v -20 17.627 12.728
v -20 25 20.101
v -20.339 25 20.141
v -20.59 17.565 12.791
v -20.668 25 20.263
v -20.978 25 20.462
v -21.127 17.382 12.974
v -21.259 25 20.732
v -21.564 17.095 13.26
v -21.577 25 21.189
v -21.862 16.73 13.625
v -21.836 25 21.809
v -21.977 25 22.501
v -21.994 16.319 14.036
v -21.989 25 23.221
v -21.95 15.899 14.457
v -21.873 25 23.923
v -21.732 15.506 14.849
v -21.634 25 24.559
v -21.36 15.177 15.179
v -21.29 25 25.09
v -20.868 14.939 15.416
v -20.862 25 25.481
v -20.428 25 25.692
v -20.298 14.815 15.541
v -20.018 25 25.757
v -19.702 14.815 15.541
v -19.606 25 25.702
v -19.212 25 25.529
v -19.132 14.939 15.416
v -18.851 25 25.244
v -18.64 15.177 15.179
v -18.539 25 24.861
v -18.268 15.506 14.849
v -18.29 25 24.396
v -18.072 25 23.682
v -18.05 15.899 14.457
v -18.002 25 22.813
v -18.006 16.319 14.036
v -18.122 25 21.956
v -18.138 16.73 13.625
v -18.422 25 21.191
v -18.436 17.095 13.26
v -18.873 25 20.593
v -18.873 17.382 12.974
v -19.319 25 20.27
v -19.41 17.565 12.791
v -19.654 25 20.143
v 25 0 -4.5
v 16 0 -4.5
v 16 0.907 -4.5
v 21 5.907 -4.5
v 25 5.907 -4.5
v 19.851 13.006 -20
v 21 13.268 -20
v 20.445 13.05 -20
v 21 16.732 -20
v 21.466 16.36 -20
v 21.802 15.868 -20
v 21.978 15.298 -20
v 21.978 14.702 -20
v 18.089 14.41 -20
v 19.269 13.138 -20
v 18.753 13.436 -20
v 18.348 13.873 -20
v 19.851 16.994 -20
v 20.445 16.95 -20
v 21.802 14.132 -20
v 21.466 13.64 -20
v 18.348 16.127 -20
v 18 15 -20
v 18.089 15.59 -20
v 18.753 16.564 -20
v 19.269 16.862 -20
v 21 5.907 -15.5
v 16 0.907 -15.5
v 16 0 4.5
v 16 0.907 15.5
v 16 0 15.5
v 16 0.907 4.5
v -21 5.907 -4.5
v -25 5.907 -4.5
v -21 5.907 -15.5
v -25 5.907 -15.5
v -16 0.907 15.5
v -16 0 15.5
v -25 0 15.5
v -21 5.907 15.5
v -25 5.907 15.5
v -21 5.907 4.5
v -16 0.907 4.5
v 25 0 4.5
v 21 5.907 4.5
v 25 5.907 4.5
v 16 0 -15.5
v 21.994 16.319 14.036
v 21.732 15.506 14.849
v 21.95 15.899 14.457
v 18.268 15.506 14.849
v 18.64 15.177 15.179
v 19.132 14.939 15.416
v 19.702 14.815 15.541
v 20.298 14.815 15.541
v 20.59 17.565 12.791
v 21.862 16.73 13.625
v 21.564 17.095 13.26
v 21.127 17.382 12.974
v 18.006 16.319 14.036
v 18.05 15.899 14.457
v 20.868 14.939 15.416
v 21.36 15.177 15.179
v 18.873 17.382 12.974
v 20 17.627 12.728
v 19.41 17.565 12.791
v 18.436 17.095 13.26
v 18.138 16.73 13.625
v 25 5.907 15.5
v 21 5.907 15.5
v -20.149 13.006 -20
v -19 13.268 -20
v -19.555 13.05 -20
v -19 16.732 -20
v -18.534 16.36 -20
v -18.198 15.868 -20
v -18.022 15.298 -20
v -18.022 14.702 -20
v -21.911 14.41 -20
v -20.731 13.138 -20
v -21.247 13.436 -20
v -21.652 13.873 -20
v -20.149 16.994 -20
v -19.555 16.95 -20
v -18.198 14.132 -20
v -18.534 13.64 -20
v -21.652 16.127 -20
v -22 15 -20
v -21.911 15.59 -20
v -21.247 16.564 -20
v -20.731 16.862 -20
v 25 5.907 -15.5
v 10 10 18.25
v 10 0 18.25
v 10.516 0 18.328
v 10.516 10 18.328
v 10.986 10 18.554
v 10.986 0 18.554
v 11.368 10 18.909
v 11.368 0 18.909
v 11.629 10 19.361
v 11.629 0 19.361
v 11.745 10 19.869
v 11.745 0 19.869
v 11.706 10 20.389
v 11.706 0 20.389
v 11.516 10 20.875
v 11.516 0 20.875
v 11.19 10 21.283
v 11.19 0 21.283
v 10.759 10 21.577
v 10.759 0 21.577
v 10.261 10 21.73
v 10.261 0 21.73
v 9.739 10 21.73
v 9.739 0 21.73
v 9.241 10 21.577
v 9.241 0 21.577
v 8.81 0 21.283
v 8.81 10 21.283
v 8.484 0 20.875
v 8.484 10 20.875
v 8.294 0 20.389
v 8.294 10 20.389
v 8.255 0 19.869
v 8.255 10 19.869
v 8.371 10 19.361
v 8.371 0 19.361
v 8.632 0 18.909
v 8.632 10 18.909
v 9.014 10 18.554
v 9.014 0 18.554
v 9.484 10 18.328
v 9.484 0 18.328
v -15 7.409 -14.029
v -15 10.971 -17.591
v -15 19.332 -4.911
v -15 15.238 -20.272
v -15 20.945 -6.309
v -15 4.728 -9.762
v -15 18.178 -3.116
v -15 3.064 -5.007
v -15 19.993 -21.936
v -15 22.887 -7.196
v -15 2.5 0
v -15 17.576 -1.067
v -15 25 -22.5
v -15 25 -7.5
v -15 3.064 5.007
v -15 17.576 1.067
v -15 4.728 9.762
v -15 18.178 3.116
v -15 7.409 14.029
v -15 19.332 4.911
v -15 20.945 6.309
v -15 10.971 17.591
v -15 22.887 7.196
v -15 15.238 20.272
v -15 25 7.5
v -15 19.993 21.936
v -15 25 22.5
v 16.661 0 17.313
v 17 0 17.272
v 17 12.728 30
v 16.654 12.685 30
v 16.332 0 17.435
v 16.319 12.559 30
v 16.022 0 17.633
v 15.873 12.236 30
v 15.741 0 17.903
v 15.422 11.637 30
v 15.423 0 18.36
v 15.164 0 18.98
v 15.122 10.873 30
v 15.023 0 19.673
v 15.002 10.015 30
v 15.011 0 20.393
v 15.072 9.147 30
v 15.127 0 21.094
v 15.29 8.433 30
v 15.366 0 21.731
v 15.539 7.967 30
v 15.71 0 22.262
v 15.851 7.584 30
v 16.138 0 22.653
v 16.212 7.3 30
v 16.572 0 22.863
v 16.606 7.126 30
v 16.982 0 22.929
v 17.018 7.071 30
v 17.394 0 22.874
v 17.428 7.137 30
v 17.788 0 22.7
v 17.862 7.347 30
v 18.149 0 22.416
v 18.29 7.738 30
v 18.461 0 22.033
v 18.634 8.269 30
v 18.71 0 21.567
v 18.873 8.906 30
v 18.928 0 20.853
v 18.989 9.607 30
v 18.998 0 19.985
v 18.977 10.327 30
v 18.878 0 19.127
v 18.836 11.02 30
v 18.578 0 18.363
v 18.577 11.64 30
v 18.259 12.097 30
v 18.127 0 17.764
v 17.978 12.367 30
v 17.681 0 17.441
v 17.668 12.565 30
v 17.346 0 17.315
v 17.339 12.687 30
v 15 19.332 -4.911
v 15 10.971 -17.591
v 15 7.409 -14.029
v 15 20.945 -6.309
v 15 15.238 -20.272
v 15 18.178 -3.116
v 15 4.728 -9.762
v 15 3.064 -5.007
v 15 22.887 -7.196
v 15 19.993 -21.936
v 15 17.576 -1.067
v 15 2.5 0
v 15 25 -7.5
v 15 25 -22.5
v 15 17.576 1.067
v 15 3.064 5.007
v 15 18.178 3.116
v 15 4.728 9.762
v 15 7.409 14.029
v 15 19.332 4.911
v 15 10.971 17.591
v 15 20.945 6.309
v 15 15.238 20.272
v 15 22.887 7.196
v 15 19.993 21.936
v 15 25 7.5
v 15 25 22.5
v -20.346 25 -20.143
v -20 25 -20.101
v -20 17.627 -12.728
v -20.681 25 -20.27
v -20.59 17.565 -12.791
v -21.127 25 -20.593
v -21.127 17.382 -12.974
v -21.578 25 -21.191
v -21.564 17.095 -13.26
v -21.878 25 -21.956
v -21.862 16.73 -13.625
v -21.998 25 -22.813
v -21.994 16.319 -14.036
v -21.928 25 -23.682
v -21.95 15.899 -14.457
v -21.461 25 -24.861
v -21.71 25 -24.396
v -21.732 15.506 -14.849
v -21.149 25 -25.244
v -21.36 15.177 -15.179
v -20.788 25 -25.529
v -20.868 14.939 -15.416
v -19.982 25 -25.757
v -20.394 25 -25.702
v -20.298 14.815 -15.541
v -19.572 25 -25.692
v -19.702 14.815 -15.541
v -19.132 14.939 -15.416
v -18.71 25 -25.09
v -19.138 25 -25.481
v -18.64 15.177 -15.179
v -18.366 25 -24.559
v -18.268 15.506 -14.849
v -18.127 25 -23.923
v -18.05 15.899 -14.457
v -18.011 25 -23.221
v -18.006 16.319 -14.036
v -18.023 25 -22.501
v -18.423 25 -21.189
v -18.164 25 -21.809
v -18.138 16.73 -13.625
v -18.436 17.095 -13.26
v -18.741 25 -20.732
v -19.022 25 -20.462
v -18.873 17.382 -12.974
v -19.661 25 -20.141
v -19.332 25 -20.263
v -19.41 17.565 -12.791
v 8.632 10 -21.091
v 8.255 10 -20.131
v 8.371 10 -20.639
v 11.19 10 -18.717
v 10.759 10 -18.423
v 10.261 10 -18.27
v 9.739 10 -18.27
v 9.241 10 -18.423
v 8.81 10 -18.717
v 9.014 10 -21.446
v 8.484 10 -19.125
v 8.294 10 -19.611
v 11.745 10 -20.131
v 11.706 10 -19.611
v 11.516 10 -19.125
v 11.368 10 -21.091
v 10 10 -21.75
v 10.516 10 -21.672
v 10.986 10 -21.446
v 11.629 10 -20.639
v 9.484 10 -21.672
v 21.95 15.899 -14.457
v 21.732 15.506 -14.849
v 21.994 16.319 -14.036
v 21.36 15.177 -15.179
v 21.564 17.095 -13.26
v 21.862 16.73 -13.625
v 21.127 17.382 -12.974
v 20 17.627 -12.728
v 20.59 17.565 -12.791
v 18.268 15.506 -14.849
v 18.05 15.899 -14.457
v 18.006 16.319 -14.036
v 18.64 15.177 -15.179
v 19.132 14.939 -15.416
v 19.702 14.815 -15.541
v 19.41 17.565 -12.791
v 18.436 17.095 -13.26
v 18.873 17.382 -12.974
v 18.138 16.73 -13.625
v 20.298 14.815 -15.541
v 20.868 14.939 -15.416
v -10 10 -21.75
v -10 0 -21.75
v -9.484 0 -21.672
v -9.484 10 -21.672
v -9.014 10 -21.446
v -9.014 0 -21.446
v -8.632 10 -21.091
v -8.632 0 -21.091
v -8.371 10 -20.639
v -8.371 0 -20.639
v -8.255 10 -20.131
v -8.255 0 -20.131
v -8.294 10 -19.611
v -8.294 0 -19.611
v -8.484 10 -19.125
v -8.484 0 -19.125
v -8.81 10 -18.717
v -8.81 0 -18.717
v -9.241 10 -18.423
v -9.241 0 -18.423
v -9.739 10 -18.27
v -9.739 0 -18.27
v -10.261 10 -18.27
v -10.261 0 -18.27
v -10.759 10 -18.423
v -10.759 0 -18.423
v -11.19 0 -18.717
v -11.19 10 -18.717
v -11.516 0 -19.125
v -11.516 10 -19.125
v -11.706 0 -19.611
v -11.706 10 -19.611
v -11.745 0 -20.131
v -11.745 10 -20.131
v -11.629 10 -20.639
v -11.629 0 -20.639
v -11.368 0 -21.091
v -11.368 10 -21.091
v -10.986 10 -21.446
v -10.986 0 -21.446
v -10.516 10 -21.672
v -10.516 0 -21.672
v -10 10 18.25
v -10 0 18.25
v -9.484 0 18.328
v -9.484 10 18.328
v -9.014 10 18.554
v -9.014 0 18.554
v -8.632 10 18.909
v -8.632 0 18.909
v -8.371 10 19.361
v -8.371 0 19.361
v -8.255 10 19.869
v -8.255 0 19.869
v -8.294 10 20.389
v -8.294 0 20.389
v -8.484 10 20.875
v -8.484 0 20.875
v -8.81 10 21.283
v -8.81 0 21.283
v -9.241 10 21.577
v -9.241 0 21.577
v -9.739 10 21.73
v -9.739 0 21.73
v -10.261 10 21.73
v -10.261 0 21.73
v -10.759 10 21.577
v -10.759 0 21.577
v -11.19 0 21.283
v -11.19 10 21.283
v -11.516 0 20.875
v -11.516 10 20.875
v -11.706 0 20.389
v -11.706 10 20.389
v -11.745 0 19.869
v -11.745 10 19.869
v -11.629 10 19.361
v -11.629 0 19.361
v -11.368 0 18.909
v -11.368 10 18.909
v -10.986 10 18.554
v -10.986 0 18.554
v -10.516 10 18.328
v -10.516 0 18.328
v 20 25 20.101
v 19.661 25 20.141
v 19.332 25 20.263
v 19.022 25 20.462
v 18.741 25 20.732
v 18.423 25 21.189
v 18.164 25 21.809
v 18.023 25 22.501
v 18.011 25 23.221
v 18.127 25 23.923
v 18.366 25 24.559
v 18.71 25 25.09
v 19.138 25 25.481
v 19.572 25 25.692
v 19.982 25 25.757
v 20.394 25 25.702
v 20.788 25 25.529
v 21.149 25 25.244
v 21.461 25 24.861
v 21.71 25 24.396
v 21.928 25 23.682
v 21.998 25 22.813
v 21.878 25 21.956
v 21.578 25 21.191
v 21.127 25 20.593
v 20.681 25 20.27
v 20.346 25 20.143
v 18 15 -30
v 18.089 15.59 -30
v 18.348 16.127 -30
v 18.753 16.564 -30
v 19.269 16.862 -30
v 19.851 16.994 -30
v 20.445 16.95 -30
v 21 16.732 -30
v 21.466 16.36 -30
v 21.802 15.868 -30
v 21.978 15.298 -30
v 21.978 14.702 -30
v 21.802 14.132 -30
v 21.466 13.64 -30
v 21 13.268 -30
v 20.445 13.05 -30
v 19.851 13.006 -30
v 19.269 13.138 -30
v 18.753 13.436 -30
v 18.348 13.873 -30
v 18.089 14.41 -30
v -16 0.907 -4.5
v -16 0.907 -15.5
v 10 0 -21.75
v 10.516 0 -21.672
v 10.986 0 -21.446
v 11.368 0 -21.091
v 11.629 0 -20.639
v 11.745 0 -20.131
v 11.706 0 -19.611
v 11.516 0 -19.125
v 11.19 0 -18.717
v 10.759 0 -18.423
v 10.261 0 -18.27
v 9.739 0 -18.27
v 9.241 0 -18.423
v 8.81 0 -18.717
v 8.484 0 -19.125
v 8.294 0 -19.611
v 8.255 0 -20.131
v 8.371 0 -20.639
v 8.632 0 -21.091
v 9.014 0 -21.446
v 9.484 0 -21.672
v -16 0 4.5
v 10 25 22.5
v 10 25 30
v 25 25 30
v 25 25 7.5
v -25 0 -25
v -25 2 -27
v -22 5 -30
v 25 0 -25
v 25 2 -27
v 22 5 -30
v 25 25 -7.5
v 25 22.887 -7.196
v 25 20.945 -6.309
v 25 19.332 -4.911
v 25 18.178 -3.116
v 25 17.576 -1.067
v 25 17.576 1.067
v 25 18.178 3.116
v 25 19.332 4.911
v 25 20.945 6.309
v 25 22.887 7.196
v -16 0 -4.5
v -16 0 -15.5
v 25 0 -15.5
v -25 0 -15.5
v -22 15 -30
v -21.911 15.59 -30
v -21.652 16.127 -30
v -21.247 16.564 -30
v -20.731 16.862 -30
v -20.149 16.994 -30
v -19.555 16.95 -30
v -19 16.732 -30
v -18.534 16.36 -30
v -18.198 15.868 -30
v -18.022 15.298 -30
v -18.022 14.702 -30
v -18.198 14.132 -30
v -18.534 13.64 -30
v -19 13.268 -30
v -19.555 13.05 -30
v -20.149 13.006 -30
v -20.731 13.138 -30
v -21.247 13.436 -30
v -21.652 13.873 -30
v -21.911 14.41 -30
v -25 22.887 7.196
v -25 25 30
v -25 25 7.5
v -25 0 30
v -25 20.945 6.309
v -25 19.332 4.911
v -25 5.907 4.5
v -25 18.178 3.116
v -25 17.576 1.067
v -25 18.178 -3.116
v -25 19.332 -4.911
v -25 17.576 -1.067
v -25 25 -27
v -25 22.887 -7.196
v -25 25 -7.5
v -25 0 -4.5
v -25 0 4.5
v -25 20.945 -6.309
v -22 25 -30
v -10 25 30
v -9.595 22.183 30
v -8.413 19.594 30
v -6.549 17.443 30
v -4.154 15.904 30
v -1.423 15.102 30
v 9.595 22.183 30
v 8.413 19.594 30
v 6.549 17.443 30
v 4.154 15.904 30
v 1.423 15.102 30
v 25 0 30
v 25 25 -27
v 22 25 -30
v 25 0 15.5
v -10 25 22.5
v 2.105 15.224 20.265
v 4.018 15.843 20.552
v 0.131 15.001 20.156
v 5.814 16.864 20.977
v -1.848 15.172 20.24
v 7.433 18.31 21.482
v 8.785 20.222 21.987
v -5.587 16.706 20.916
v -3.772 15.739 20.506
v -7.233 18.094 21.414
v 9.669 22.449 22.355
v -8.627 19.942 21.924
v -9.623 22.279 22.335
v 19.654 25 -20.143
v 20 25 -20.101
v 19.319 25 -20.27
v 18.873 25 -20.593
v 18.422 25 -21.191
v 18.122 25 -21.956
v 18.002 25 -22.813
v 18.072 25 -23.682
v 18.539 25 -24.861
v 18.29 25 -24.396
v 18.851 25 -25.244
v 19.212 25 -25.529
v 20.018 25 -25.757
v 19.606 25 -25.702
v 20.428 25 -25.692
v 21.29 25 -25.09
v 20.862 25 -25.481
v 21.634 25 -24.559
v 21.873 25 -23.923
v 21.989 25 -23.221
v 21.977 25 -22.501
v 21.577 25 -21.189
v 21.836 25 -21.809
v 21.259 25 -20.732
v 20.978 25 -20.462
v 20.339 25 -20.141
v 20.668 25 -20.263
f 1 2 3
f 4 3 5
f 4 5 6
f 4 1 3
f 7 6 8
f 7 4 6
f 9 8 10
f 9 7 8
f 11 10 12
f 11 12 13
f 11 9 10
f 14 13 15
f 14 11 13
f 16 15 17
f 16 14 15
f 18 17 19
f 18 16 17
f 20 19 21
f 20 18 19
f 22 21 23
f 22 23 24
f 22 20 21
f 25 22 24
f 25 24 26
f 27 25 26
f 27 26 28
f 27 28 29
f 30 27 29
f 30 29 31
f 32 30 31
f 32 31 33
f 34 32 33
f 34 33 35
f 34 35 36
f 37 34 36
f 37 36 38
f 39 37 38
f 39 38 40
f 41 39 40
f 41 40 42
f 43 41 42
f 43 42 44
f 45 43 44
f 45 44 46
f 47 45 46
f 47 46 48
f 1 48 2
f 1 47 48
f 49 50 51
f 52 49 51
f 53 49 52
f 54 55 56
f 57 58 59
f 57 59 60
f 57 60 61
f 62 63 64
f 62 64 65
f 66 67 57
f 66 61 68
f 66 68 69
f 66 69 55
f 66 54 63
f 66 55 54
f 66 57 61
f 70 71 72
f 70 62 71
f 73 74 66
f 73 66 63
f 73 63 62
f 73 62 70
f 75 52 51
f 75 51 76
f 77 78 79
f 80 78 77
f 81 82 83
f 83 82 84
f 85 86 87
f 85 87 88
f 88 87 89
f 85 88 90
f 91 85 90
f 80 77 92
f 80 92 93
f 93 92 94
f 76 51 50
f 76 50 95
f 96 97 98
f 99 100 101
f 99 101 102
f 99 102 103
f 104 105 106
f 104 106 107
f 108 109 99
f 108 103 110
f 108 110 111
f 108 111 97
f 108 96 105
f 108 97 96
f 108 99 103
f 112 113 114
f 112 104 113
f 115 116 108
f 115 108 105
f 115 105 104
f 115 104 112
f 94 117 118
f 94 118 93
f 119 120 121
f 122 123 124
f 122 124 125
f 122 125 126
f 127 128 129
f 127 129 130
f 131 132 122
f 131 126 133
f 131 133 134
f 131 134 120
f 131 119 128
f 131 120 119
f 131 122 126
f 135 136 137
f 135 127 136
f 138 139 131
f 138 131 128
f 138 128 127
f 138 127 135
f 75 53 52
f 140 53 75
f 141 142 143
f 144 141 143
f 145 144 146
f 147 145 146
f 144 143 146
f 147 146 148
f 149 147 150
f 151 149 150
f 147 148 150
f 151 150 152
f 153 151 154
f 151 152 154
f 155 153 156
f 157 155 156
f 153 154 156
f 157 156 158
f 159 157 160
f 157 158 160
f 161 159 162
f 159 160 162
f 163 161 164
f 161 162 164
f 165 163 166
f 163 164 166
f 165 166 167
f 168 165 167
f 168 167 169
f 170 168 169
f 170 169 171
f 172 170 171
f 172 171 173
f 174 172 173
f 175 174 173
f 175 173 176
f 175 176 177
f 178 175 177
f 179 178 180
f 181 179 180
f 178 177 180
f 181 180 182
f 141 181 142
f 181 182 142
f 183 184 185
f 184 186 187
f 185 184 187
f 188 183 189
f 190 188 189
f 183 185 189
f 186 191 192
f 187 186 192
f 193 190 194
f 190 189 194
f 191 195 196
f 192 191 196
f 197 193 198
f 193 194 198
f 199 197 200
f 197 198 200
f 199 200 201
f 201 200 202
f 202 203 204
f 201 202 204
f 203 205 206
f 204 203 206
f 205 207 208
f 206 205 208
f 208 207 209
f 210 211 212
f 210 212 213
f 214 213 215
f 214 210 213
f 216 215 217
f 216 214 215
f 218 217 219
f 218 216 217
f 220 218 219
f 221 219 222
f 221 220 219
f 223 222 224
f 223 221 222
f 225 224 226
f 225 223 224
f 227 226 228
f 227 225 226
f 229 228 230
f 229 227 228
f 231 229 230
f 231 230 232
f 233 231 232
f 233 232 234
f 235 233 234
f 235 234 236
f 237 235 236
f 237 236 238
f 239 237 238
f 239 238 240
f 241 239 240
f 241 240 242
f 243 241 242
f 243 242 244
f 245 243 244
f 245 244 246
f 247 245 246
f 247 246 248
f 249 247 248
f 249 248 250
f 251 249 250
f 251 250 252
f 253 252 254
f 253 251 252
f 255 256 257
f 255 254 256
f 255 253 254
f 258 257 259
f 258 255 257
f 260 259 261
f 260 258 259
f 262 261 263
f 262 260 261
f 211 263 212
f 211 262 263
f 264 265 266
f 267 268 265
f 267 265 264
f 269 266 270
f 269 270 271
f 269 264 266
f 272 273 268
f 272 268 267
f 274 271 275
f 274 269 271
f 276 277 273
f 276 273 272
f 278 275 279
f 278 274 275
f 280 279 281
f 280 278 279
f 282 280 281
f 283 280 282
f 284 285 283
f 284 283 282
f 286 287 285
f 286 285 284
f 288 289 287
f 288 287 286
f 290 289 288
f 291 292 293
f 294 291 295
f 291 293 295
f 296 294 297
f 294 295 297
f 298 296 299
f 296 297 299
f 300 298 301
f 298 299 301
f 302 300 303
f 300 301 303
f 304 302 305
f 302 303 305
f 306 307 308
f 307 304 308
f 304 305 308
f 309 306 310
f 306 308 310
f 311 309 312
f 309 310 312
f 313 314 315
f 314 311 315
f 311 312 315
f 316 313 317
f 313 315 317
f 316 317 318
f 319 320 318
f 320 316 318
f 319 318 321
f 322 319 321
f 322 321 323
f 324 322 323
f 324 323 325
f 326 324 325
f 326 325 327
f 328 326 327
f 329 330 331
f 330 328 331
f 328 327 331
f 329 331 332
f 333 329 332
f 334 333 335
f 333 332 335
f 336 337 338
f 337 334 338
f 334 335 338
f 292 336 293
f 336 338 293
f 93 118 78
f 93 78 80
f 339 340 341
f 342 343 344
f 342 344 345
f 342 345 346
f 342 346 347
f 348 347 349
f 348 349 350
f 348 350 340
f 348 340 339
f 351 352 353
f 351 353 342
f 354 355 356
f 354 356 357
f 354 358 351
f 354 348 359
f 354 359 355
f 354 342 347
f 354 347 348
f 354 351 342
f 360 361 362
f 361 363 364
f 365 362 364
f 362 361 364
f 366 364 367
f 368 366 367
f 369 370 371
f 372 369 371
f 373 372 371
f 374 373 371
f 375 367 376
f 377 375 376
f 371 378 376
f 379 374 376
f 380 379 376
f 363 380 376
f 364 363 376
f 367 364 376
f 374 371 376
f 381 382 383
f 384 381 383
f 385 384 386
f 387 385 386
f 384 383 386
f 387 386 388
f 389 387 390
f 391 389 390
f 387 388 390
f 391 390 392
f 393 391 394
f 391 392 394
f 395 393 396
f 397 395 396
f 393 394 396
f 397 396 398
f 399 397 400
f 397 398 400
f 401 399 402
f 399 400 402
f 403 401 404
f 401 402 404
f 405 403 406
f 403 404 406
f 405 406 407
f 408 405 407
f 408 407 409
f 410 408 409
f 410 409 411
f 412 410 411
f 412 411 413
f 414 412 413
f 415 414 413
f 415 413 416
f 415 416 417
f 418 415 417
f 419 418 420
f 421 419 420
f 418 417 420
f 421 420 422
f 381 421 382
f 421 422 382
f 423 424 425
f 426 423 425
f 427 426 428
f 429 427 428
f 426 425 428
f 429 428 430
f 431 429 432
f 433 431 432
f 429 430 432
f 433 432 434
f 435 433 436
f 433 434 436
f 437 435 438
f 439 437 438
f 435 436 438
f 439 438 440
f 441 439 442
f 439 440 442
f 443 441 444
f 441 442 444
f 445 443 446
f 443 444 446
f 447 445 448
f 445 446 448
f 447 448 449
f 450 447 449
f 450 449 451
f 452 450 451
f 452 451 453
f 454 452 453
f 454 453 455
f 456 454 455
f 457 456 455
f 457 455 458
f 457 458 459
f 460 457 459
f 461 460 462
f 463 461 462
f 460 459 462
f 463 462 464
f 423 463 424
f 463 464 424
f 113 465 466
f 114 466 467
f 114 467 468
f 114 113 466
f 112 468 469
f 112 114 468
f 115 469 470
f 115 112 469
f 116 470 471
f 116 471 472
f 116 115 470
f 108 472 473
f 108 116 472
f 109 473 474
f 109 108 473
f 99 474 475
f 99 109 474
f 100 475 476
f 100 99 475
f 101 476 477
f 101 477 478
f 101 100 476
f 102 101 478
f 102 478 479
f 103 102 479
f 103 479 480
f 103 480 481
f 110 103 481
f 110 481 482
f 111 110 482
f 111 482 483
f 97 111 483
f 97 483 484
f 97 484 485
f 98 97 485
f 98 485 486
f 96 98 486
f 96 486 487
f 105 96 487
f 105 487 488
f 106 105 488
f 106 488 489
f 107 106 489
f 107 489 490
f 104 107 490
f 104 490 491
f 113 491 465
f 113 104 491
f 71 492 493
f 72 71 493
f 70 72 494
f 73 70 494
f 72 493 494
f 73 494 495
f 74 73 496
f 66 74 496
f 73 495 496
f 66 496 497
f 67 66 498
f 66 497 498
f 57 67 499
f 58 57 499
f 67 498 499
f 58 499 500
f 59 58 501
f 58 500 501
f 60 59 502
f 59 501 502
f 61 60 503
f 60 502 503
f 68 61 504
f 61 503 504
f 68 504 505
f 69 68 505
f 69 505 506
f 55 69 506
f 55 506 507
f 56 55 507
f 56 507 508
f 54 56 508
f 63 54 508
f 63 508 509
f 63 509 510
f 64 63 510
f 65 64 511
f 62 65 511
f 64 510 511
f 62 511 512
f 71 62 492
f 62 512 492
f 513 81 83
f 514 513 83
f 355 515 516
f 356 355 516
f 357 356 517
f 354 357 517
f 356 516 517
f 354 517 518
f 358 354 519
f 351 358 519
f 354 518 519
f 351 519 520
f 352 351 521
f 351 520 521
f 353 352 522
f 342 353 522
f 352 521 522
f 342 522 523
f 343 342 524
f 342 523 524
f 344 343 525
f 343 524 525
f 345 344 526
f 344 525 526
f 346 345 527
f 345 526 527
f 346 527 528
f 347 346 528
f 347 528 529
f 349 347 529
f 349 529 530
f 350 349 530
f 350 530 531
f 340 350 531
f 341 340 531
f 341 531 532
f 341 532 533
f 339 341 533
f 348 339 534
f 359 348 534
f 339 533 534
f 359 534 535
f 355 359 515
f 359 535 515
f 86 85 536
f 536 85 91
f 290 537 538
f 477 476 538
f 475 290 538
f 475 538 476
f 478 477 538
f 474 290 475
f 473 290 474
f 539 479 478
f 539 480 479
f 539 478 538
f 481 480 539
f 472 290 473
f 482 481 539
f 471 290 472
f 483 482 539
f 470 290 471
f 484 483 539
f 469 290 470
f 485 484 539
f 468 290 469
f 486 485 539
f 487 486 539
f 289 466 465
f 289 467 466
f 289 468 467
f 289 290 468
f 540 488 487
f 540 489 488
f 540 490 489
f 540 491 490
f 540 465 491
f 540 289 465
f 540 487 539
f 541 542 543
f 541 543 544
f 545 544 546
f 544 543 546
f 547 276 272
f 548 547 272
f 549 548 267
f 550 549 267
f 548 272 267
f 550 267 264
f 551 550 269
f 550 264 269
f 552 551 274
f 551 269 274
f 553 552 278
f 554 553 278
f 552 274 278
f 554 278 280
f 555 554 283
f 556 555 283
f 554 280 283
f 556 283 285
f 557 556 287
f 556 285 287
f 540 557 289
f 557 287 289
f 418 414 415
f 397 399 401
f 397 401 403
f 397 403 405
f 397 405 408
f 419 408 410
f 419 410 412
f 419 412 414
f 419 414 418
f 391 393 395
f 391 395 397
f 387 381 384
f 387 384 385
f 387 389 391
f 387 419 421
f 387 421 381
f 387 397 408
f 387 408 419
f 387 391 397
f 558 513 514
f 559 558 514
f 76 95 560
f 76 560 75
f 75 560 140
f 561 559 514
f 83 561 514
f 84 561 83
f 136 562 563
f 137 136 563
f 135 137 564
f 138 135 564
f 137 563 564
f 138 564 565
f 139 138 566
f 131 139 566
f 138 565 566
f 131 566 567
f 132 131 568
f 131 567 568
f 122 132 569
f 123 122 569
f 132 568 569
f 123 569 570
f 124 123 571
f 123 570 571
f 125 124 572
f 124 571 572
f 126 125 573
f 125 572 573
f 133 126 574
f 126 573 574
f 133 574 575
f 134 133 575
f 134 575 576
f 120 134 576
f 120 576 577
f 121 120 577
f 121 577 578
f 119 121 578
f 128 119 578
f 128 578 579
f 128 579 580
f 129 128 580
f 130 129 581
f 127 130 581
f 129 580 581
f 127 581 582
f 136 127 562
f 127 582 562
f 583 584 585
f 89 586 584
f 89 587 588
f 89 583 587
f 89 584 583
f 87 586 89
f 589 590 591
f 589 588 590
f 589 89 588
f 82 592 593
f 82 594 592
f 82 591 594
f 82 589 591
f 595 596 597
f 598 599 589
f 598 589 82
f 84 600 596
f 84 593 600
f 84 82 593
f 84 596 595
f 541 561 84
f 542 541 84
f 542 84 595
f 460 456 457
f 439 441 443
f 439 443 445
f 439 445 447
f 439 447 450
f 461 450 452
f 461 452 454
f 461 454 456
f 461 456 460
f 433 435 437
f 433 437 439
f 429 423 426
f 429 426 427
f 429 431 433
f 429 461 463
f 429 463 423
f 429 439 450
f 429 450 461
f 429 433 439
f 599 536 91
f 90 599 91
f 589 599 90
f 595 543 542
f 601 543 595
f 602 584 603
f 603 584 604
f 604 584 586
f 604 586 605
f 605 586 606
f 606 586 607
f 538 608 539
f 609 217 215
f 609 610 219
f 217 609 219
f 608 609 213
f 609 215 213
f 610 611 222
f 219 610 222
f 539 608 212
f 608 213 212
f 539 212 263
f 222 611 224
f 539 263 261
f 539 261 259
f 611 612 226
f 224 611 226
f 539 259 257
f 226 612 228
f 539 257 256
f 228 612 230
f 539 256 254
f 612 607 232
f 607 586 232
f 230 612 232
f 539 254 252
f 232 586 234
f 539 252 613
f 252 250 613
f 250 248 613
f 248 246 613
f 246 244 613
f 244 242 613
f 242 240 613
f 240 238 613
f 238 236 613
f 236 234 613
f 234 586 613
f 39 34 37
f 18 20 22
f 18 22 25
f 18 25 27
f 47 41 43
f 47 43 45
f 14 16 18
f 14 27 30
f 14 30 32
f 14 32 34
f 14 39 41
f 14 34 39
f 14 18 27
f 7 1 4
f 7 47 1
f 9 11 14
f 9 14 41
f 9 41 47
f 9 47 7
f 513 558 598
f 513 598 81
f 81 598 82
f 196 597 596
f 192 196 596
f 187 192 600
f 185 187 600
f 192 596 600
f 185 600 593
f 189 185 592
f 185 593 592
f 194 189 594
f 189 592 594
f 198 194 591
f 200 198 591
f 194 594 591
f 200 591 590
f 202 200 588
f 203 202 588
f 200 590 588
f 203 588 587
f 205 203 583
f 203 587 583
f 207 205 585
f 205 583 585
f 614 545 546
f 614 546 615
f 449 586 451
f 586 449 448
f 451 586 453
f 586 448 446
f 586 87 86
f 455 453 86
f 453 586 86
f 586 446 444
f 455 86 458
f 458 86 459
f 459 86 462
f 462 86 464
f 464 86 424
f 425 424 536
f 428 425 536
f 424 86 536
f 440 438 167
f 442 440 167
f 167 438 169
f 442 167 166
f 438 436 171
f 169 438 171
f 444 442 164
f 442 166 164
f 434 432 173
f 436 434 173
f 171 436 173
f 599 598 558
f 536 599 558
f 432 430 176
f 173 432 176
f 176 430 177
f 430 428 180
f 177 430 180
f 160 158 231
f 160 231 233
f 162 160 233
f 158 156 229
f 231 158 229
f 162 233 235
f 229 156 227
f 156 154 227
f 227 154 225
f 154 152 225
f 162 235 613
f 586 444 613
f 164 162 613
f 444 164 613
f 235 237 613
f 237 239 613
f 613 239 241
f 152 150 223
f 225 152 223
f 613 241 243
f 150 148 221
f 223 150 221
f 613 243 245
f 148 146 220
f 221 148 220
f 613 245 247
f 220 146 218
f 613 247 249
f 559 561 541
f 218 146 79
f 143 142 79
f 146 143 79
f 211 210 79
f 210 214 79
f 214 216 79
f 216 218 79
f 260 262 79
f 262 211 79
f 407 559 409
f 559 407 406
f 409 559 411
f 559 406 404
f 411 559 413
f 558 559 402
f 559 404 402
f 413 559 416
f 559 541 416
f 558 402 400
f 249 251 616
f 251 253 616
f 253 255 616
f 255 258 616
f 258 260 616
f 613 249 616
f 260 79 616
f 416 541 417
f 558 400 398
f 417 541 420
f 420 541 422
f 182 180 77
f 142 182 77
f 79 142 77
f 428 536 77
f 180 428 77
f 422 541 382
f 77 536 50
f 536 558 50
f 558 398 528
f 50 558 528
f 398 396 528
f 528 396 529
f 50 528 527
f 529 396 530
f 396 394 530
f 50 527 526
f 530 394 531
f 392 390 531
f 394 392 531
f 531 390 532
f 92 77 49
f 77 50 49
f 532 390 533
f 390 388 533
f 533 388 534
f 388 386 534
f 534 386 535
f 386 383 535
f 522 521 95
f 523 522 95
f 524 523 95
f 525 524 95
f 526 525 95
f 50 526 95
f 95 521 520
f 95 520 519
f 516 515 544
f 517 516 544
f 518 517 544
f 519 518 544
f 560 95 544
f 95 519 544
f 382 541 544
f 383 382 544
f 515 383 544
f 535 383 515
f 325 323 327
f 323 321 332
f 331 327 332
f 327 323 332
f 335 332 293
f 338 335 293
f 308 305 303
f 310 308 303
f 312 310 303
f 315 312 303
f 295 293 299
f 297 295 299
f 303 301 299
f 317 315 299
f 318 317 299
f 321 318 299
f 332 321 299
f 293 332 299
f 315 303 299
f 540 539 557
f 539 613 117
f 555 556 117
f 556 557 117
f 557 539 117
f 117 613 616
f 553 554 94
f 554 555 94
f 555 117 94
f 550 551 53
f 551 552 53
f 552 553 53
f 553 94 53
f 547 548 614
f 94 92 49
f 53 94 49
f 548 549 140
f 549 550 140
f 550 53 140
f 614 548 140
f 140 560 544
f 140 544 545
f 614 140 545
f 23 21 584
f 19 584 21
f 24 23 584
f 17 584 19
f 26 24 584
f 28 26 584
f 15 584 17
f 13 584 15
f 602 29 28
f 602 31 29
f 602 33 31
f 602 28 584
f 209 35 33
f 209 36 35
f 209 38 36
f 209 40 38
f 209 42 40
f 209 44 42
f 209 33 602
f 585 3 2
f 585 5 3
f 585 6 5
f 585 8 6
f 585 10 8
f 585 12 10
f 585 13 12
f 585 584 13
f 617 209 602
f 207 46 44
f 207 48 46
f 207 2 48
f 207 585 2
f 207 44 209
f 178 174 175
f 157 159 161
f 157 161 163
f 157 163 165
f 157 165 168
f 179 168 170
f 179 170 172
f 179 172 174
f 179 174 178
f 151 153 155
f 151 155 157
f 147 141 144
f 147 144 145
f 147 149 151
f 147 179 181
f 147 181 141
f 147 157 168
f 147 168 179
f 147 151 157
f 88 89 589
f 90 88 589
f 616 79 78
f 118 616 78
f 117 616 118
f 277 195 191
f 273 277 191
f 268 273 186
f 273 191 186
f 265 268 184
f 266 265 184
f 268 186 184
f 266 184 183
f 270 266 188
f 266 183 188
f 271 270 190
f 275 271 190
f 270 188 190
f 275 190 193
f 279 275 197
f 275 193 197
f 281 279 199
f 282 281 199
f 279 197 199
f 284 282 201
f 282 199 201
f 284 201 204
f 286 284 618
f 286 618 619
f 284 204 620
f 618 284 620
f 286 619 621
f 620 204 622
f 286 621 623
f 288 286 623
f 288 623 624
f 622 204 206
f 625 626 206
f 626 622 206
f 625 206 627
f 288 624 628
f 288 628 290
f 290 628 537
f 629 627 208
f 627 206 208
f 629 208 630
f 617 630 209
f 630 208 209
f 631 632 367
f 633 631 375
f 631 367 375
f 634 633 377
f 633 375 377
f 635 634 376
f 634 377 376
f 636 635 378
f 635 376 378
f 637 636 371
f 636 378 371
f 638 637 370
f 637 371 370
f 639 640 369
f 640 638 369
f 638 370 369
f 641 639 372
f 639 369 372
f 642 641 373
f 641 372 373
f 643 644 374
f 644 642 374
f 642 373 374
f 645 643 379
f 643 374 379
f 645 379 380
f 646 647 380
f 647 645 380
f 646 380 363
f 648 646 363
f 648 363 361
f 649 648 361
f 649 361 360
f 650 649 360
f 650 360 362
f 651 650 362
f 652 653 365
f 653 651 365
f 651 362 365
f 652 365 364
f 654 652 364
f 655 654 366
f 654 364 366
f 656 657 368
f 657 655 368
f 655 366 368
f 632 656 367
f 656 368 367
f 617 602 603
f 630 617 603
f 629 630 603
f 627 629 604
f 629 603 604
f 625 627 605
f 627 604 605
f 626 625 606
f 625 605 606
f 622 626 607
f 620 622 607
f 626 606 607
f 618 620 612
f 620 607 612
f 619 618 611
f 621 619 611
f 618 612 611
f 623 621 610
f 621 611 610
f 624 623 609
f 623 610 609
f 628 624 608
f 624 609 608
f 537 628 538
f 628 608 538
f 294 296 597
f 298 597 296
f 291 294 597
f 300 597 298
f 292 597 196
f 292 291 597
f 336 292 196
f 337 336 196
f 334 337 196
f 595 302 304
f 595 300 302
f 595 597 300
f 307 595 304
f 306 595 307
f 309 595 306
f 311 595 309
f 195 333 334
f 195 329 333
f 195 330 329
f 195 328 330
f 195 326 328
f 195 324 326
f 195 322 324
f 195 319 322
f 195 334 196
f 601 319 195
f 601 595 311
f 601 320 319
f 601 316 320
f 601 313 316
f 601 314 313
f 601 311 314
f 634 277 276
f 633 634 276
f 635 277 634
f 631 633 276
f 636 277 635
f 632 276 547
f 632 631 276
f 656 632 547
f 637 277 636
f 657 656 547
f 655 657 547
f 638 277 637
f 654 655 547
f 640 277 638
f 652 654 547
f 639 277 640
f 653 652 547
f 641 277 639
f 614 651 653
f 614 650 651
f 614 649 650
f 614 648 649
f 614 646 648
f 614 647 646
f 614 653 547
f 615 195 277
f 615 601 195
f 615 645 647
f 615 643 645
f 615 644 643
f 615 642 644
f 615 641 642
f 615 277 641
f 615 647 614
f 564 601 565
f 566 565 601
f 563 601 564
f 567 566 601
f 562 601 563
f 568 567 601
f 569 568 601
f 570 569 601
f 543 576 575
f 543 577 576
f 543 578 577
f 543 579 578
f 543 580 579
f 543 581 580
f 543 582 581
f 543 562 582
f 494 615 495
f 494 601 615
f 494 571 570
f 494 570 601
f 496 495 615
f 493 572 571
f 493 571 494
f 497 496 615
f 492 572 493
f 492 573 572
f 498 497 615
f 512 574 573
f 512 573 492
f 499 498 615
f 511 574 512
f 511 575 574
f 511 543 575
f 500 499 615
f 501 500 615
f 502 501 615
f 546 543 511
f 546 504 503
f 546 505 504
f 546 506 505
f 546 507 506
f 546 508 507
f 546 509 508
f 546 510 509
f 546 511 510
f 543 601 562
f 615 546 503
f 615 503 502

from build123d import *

# Parameters (mm, degrees)
SKETCH1_W                = 50
SKETCH1_H                = 60
BOSS_EXTRUDE1_DEPTH      = 25
CUT_EXTRUDE1_START       = -10
SKETCH2_R                = 22.5
CUT_EXTRUDE1_DEPTH       = 30
SKETCH3_R                = 7.5
CUT_EXTRUDE2_DEPTH       = 64.442887702
SKETCH4_R                = 10
CUT_EXTRUDE3_DEPTH       = 10
SKETCH5_R                = 1.75
CUT_EXTRUDE4_DEPTH       = 10
CHAMFER1_SIZE            = 5
SKETCH6_R                = 2
CUT_EXTRUDE5_DEPTH       = 10
SKETCH7_W                = 11
SKETCH7_H                = 5.906734889
CUT_EXTRUDE6_DEPTH       = 9
CHAMFER2_SIZE            = 5
CHAMFER2_OF_MIRROR1_SIZE = 5
CHAMFER3_SIZE            = 3
CUT_EXTRUDE8_START       = 25
SKETCH10_R               = 2
CUT_EXTRUDE8_DEPTH       = 25.371044267
SKETCH11_R               = 2
CUT_EXTRUDE9_DEPTH       = 50.371044267


with BuildPart() as part:
    # Sketch1 → Boss-Extrude1 (new body)
    with BuildSketch(Plane(origin=(0, 0, 0), x_dir=(1, 0, 0), z_dir=(0, 1, 0))):
        Rectangle(SKETCH1_W, SKETCH1_H)
    extrude(amount=BOSS_EXTRUDE1_DEPTH)

    # Sketch2 → Cut-Extrude1 (cut)
    with BuildSketch(Plane.ZY.offset(25).offset(CUT_EXTRUDE1_START)):
        with Locations((0, 25)):
            Circle(SKETCH2_R)
    extrude(amount=-CUT_EXTRUDE1_DEPTH, mode=Mode.SUBTRACT)

    # Sketch3 → Cut-Extrude2 (cut, through all)
    with BuildSketch(Plane.ZY.offset(25)):
        with Locations((0, 25)):
            Circle(SKETCH3_R)
    extrude(amount=-CUT_EXTRUDE2_DEPTH, mode=Mode.SUBTRACT)

    # Sketch4 → Cut-Extrude3 (cut)
    with BuildSketch(Plane.XY.offset(30)):
        with Locations((0, 25)):
            Circle(SKETCH4_R)
    extrude(amount=-CUT_EXTRUDE3_DEPTH, mode=Mode.SUBTRACT)

    # Sketch5 → Cut-Extrude4 (cut)
    with BuildSketch(Plane.XZ):
        with Locations(Location((-10, 20, 0), (0, 0, 270))):
            Circle(SKETCH5_R)
        with Locations(Location((10, 20, 0), (0, 0, 270))):
            Circle(SKETCH5_R)
        with Locations(Location((-10, -20, 0), (0, 0, 270))):
            Circle(SKETCH5_R)
        with Locations(Location((10, -20, 0), (0, 0, 270))):
            Circle(SKETCH5_R)
    extrude(amount=-CUT_EXTRUDE4_DEPTH, mode=Mode.SUBTRACT)

    # Chamfer1
    chamfer1_edges = [part.edges().sort_by_distance(p)[0] for p in [
        (0, 0, -30),
    ]]
    chamfer(chamfer1_edges, length=CHAMFER1_SIZE)

    # Sketch6 → Cut-Extrude5 (cut)
    with BuildSketch(Plane(origin=(0, 0, -30), x_dir=(-1, 0, 0), z_dir=(0, 0, -1))):
        with Locations((-20, 15)):
            Circle(SKETCH6_R)
        with Locations((20, 15)):
            Circle(SKETCH6_R)
    extrude(amount=-CUT_EXTRUDE5_DEPTH, mode=Mode.SUBTRACT)

    # Sketch7 → Cut-Extrude6 (cut)
    with BuildSketch(Plane(origin=(25, 0, 0), x_dir=(0, 0, -1), z_dir=(1, 0, 0))):
        with Locations((-10, 2.953367444)):
            Rectangle(SKETCH7_W, SKETCH7_H)
        with Locations((10, 2.953367444)):
            Rectangle(SKETCH7_W, SKETCH7_H)
    cut_extrude6 = extrude(amount=-CUT_EXTRUDE6_DEPTH, mode=Mode.SUBTRACT)

    # Chamfer2
    chamfer2_edges = [part.edges().sort_by_distance(p)[0] for p in [
        (16, 5.906734889, 10),
        (16, 5.906734889, -10),
    ]]
    chamfer(chamfer2_edges, length=CHAMFER2_SIZE)

    # Mirror1: Cut-Extrude6 across plane
    add(cut_extrude6.mirror(Plane(origin=(0, 0, 0), x_dir=(0, 0, 1), z_dir=(1, 0, 0))), mode=Mode.SUBTRACT)

    # Chamfer2 of Mirror1
    chamfer2_of_mirror1_edges = [part.edges().sort_by_distance(p)[0] for p in [
        (-16, 5.906734889, 10),
        (-16, 5.906734889, -10),
    ]]
    chamfer(chamfer2_of_mirror1_edges, length=CHAMFER2_OF_MIRROR1_SIZE)

    # Chamfer3
    chamfer3_edges = [part.edges().sort_by_distance(p)[0] for p in [
        (-25, 15, -30),
        (25, 15, -30),
    ]]
    chamfer(chamfer3_edges, length=CHAMFER3_SIZE - 0.0001)  # a hair under: the kernel refuses the full size

    # Sketch10 → Cut-Extrude8 (cut, through all)
    with BuildSketch(Plane(origin=(0, -2.5, -2.5), x_dir=(1, 0, 0), z_dir=(0, 0.7071067811865475, 0.7071067811865477)).offset(CUT_EXTRUDE8_START)):
        with Locations(Location((-20, 1.464466094, 0), (0, 0, 90))):
            Circle(SKETCH10_R)
        with Locations(Location((20, 1.464466094, 0), (0, 0, 90))):
            Circle(SKETCH10_R)
    cut_extrude8 = extrude(amount=CUT_EXTRUDE8_DEPTH, mode=Mode.SUBTRACT)

    # Mirror2: Cut-Extrude8 across plane
    add(cut_extrude8.mirror(Plane.XY), mode=Mode.SUBTRACT)

    # Sketch11 → Cut-Extrude9 (cut, through all)
    with BuildSketch(Plane(origin=(0, -2.5, -2.5), x_dir=(1, 0, 0), z_dir=(0, 0.7071067811865475, 0.7071067811865477))):
        with Locations(Location((17, -14.213203436, 0), (0, 0, 90))):
            Circle(SKETCH11_R)
    extrude(amount=CUT_EXTRUDE9_DEPTH, mode=Mode.SUBTRACT)


solid = part.part
